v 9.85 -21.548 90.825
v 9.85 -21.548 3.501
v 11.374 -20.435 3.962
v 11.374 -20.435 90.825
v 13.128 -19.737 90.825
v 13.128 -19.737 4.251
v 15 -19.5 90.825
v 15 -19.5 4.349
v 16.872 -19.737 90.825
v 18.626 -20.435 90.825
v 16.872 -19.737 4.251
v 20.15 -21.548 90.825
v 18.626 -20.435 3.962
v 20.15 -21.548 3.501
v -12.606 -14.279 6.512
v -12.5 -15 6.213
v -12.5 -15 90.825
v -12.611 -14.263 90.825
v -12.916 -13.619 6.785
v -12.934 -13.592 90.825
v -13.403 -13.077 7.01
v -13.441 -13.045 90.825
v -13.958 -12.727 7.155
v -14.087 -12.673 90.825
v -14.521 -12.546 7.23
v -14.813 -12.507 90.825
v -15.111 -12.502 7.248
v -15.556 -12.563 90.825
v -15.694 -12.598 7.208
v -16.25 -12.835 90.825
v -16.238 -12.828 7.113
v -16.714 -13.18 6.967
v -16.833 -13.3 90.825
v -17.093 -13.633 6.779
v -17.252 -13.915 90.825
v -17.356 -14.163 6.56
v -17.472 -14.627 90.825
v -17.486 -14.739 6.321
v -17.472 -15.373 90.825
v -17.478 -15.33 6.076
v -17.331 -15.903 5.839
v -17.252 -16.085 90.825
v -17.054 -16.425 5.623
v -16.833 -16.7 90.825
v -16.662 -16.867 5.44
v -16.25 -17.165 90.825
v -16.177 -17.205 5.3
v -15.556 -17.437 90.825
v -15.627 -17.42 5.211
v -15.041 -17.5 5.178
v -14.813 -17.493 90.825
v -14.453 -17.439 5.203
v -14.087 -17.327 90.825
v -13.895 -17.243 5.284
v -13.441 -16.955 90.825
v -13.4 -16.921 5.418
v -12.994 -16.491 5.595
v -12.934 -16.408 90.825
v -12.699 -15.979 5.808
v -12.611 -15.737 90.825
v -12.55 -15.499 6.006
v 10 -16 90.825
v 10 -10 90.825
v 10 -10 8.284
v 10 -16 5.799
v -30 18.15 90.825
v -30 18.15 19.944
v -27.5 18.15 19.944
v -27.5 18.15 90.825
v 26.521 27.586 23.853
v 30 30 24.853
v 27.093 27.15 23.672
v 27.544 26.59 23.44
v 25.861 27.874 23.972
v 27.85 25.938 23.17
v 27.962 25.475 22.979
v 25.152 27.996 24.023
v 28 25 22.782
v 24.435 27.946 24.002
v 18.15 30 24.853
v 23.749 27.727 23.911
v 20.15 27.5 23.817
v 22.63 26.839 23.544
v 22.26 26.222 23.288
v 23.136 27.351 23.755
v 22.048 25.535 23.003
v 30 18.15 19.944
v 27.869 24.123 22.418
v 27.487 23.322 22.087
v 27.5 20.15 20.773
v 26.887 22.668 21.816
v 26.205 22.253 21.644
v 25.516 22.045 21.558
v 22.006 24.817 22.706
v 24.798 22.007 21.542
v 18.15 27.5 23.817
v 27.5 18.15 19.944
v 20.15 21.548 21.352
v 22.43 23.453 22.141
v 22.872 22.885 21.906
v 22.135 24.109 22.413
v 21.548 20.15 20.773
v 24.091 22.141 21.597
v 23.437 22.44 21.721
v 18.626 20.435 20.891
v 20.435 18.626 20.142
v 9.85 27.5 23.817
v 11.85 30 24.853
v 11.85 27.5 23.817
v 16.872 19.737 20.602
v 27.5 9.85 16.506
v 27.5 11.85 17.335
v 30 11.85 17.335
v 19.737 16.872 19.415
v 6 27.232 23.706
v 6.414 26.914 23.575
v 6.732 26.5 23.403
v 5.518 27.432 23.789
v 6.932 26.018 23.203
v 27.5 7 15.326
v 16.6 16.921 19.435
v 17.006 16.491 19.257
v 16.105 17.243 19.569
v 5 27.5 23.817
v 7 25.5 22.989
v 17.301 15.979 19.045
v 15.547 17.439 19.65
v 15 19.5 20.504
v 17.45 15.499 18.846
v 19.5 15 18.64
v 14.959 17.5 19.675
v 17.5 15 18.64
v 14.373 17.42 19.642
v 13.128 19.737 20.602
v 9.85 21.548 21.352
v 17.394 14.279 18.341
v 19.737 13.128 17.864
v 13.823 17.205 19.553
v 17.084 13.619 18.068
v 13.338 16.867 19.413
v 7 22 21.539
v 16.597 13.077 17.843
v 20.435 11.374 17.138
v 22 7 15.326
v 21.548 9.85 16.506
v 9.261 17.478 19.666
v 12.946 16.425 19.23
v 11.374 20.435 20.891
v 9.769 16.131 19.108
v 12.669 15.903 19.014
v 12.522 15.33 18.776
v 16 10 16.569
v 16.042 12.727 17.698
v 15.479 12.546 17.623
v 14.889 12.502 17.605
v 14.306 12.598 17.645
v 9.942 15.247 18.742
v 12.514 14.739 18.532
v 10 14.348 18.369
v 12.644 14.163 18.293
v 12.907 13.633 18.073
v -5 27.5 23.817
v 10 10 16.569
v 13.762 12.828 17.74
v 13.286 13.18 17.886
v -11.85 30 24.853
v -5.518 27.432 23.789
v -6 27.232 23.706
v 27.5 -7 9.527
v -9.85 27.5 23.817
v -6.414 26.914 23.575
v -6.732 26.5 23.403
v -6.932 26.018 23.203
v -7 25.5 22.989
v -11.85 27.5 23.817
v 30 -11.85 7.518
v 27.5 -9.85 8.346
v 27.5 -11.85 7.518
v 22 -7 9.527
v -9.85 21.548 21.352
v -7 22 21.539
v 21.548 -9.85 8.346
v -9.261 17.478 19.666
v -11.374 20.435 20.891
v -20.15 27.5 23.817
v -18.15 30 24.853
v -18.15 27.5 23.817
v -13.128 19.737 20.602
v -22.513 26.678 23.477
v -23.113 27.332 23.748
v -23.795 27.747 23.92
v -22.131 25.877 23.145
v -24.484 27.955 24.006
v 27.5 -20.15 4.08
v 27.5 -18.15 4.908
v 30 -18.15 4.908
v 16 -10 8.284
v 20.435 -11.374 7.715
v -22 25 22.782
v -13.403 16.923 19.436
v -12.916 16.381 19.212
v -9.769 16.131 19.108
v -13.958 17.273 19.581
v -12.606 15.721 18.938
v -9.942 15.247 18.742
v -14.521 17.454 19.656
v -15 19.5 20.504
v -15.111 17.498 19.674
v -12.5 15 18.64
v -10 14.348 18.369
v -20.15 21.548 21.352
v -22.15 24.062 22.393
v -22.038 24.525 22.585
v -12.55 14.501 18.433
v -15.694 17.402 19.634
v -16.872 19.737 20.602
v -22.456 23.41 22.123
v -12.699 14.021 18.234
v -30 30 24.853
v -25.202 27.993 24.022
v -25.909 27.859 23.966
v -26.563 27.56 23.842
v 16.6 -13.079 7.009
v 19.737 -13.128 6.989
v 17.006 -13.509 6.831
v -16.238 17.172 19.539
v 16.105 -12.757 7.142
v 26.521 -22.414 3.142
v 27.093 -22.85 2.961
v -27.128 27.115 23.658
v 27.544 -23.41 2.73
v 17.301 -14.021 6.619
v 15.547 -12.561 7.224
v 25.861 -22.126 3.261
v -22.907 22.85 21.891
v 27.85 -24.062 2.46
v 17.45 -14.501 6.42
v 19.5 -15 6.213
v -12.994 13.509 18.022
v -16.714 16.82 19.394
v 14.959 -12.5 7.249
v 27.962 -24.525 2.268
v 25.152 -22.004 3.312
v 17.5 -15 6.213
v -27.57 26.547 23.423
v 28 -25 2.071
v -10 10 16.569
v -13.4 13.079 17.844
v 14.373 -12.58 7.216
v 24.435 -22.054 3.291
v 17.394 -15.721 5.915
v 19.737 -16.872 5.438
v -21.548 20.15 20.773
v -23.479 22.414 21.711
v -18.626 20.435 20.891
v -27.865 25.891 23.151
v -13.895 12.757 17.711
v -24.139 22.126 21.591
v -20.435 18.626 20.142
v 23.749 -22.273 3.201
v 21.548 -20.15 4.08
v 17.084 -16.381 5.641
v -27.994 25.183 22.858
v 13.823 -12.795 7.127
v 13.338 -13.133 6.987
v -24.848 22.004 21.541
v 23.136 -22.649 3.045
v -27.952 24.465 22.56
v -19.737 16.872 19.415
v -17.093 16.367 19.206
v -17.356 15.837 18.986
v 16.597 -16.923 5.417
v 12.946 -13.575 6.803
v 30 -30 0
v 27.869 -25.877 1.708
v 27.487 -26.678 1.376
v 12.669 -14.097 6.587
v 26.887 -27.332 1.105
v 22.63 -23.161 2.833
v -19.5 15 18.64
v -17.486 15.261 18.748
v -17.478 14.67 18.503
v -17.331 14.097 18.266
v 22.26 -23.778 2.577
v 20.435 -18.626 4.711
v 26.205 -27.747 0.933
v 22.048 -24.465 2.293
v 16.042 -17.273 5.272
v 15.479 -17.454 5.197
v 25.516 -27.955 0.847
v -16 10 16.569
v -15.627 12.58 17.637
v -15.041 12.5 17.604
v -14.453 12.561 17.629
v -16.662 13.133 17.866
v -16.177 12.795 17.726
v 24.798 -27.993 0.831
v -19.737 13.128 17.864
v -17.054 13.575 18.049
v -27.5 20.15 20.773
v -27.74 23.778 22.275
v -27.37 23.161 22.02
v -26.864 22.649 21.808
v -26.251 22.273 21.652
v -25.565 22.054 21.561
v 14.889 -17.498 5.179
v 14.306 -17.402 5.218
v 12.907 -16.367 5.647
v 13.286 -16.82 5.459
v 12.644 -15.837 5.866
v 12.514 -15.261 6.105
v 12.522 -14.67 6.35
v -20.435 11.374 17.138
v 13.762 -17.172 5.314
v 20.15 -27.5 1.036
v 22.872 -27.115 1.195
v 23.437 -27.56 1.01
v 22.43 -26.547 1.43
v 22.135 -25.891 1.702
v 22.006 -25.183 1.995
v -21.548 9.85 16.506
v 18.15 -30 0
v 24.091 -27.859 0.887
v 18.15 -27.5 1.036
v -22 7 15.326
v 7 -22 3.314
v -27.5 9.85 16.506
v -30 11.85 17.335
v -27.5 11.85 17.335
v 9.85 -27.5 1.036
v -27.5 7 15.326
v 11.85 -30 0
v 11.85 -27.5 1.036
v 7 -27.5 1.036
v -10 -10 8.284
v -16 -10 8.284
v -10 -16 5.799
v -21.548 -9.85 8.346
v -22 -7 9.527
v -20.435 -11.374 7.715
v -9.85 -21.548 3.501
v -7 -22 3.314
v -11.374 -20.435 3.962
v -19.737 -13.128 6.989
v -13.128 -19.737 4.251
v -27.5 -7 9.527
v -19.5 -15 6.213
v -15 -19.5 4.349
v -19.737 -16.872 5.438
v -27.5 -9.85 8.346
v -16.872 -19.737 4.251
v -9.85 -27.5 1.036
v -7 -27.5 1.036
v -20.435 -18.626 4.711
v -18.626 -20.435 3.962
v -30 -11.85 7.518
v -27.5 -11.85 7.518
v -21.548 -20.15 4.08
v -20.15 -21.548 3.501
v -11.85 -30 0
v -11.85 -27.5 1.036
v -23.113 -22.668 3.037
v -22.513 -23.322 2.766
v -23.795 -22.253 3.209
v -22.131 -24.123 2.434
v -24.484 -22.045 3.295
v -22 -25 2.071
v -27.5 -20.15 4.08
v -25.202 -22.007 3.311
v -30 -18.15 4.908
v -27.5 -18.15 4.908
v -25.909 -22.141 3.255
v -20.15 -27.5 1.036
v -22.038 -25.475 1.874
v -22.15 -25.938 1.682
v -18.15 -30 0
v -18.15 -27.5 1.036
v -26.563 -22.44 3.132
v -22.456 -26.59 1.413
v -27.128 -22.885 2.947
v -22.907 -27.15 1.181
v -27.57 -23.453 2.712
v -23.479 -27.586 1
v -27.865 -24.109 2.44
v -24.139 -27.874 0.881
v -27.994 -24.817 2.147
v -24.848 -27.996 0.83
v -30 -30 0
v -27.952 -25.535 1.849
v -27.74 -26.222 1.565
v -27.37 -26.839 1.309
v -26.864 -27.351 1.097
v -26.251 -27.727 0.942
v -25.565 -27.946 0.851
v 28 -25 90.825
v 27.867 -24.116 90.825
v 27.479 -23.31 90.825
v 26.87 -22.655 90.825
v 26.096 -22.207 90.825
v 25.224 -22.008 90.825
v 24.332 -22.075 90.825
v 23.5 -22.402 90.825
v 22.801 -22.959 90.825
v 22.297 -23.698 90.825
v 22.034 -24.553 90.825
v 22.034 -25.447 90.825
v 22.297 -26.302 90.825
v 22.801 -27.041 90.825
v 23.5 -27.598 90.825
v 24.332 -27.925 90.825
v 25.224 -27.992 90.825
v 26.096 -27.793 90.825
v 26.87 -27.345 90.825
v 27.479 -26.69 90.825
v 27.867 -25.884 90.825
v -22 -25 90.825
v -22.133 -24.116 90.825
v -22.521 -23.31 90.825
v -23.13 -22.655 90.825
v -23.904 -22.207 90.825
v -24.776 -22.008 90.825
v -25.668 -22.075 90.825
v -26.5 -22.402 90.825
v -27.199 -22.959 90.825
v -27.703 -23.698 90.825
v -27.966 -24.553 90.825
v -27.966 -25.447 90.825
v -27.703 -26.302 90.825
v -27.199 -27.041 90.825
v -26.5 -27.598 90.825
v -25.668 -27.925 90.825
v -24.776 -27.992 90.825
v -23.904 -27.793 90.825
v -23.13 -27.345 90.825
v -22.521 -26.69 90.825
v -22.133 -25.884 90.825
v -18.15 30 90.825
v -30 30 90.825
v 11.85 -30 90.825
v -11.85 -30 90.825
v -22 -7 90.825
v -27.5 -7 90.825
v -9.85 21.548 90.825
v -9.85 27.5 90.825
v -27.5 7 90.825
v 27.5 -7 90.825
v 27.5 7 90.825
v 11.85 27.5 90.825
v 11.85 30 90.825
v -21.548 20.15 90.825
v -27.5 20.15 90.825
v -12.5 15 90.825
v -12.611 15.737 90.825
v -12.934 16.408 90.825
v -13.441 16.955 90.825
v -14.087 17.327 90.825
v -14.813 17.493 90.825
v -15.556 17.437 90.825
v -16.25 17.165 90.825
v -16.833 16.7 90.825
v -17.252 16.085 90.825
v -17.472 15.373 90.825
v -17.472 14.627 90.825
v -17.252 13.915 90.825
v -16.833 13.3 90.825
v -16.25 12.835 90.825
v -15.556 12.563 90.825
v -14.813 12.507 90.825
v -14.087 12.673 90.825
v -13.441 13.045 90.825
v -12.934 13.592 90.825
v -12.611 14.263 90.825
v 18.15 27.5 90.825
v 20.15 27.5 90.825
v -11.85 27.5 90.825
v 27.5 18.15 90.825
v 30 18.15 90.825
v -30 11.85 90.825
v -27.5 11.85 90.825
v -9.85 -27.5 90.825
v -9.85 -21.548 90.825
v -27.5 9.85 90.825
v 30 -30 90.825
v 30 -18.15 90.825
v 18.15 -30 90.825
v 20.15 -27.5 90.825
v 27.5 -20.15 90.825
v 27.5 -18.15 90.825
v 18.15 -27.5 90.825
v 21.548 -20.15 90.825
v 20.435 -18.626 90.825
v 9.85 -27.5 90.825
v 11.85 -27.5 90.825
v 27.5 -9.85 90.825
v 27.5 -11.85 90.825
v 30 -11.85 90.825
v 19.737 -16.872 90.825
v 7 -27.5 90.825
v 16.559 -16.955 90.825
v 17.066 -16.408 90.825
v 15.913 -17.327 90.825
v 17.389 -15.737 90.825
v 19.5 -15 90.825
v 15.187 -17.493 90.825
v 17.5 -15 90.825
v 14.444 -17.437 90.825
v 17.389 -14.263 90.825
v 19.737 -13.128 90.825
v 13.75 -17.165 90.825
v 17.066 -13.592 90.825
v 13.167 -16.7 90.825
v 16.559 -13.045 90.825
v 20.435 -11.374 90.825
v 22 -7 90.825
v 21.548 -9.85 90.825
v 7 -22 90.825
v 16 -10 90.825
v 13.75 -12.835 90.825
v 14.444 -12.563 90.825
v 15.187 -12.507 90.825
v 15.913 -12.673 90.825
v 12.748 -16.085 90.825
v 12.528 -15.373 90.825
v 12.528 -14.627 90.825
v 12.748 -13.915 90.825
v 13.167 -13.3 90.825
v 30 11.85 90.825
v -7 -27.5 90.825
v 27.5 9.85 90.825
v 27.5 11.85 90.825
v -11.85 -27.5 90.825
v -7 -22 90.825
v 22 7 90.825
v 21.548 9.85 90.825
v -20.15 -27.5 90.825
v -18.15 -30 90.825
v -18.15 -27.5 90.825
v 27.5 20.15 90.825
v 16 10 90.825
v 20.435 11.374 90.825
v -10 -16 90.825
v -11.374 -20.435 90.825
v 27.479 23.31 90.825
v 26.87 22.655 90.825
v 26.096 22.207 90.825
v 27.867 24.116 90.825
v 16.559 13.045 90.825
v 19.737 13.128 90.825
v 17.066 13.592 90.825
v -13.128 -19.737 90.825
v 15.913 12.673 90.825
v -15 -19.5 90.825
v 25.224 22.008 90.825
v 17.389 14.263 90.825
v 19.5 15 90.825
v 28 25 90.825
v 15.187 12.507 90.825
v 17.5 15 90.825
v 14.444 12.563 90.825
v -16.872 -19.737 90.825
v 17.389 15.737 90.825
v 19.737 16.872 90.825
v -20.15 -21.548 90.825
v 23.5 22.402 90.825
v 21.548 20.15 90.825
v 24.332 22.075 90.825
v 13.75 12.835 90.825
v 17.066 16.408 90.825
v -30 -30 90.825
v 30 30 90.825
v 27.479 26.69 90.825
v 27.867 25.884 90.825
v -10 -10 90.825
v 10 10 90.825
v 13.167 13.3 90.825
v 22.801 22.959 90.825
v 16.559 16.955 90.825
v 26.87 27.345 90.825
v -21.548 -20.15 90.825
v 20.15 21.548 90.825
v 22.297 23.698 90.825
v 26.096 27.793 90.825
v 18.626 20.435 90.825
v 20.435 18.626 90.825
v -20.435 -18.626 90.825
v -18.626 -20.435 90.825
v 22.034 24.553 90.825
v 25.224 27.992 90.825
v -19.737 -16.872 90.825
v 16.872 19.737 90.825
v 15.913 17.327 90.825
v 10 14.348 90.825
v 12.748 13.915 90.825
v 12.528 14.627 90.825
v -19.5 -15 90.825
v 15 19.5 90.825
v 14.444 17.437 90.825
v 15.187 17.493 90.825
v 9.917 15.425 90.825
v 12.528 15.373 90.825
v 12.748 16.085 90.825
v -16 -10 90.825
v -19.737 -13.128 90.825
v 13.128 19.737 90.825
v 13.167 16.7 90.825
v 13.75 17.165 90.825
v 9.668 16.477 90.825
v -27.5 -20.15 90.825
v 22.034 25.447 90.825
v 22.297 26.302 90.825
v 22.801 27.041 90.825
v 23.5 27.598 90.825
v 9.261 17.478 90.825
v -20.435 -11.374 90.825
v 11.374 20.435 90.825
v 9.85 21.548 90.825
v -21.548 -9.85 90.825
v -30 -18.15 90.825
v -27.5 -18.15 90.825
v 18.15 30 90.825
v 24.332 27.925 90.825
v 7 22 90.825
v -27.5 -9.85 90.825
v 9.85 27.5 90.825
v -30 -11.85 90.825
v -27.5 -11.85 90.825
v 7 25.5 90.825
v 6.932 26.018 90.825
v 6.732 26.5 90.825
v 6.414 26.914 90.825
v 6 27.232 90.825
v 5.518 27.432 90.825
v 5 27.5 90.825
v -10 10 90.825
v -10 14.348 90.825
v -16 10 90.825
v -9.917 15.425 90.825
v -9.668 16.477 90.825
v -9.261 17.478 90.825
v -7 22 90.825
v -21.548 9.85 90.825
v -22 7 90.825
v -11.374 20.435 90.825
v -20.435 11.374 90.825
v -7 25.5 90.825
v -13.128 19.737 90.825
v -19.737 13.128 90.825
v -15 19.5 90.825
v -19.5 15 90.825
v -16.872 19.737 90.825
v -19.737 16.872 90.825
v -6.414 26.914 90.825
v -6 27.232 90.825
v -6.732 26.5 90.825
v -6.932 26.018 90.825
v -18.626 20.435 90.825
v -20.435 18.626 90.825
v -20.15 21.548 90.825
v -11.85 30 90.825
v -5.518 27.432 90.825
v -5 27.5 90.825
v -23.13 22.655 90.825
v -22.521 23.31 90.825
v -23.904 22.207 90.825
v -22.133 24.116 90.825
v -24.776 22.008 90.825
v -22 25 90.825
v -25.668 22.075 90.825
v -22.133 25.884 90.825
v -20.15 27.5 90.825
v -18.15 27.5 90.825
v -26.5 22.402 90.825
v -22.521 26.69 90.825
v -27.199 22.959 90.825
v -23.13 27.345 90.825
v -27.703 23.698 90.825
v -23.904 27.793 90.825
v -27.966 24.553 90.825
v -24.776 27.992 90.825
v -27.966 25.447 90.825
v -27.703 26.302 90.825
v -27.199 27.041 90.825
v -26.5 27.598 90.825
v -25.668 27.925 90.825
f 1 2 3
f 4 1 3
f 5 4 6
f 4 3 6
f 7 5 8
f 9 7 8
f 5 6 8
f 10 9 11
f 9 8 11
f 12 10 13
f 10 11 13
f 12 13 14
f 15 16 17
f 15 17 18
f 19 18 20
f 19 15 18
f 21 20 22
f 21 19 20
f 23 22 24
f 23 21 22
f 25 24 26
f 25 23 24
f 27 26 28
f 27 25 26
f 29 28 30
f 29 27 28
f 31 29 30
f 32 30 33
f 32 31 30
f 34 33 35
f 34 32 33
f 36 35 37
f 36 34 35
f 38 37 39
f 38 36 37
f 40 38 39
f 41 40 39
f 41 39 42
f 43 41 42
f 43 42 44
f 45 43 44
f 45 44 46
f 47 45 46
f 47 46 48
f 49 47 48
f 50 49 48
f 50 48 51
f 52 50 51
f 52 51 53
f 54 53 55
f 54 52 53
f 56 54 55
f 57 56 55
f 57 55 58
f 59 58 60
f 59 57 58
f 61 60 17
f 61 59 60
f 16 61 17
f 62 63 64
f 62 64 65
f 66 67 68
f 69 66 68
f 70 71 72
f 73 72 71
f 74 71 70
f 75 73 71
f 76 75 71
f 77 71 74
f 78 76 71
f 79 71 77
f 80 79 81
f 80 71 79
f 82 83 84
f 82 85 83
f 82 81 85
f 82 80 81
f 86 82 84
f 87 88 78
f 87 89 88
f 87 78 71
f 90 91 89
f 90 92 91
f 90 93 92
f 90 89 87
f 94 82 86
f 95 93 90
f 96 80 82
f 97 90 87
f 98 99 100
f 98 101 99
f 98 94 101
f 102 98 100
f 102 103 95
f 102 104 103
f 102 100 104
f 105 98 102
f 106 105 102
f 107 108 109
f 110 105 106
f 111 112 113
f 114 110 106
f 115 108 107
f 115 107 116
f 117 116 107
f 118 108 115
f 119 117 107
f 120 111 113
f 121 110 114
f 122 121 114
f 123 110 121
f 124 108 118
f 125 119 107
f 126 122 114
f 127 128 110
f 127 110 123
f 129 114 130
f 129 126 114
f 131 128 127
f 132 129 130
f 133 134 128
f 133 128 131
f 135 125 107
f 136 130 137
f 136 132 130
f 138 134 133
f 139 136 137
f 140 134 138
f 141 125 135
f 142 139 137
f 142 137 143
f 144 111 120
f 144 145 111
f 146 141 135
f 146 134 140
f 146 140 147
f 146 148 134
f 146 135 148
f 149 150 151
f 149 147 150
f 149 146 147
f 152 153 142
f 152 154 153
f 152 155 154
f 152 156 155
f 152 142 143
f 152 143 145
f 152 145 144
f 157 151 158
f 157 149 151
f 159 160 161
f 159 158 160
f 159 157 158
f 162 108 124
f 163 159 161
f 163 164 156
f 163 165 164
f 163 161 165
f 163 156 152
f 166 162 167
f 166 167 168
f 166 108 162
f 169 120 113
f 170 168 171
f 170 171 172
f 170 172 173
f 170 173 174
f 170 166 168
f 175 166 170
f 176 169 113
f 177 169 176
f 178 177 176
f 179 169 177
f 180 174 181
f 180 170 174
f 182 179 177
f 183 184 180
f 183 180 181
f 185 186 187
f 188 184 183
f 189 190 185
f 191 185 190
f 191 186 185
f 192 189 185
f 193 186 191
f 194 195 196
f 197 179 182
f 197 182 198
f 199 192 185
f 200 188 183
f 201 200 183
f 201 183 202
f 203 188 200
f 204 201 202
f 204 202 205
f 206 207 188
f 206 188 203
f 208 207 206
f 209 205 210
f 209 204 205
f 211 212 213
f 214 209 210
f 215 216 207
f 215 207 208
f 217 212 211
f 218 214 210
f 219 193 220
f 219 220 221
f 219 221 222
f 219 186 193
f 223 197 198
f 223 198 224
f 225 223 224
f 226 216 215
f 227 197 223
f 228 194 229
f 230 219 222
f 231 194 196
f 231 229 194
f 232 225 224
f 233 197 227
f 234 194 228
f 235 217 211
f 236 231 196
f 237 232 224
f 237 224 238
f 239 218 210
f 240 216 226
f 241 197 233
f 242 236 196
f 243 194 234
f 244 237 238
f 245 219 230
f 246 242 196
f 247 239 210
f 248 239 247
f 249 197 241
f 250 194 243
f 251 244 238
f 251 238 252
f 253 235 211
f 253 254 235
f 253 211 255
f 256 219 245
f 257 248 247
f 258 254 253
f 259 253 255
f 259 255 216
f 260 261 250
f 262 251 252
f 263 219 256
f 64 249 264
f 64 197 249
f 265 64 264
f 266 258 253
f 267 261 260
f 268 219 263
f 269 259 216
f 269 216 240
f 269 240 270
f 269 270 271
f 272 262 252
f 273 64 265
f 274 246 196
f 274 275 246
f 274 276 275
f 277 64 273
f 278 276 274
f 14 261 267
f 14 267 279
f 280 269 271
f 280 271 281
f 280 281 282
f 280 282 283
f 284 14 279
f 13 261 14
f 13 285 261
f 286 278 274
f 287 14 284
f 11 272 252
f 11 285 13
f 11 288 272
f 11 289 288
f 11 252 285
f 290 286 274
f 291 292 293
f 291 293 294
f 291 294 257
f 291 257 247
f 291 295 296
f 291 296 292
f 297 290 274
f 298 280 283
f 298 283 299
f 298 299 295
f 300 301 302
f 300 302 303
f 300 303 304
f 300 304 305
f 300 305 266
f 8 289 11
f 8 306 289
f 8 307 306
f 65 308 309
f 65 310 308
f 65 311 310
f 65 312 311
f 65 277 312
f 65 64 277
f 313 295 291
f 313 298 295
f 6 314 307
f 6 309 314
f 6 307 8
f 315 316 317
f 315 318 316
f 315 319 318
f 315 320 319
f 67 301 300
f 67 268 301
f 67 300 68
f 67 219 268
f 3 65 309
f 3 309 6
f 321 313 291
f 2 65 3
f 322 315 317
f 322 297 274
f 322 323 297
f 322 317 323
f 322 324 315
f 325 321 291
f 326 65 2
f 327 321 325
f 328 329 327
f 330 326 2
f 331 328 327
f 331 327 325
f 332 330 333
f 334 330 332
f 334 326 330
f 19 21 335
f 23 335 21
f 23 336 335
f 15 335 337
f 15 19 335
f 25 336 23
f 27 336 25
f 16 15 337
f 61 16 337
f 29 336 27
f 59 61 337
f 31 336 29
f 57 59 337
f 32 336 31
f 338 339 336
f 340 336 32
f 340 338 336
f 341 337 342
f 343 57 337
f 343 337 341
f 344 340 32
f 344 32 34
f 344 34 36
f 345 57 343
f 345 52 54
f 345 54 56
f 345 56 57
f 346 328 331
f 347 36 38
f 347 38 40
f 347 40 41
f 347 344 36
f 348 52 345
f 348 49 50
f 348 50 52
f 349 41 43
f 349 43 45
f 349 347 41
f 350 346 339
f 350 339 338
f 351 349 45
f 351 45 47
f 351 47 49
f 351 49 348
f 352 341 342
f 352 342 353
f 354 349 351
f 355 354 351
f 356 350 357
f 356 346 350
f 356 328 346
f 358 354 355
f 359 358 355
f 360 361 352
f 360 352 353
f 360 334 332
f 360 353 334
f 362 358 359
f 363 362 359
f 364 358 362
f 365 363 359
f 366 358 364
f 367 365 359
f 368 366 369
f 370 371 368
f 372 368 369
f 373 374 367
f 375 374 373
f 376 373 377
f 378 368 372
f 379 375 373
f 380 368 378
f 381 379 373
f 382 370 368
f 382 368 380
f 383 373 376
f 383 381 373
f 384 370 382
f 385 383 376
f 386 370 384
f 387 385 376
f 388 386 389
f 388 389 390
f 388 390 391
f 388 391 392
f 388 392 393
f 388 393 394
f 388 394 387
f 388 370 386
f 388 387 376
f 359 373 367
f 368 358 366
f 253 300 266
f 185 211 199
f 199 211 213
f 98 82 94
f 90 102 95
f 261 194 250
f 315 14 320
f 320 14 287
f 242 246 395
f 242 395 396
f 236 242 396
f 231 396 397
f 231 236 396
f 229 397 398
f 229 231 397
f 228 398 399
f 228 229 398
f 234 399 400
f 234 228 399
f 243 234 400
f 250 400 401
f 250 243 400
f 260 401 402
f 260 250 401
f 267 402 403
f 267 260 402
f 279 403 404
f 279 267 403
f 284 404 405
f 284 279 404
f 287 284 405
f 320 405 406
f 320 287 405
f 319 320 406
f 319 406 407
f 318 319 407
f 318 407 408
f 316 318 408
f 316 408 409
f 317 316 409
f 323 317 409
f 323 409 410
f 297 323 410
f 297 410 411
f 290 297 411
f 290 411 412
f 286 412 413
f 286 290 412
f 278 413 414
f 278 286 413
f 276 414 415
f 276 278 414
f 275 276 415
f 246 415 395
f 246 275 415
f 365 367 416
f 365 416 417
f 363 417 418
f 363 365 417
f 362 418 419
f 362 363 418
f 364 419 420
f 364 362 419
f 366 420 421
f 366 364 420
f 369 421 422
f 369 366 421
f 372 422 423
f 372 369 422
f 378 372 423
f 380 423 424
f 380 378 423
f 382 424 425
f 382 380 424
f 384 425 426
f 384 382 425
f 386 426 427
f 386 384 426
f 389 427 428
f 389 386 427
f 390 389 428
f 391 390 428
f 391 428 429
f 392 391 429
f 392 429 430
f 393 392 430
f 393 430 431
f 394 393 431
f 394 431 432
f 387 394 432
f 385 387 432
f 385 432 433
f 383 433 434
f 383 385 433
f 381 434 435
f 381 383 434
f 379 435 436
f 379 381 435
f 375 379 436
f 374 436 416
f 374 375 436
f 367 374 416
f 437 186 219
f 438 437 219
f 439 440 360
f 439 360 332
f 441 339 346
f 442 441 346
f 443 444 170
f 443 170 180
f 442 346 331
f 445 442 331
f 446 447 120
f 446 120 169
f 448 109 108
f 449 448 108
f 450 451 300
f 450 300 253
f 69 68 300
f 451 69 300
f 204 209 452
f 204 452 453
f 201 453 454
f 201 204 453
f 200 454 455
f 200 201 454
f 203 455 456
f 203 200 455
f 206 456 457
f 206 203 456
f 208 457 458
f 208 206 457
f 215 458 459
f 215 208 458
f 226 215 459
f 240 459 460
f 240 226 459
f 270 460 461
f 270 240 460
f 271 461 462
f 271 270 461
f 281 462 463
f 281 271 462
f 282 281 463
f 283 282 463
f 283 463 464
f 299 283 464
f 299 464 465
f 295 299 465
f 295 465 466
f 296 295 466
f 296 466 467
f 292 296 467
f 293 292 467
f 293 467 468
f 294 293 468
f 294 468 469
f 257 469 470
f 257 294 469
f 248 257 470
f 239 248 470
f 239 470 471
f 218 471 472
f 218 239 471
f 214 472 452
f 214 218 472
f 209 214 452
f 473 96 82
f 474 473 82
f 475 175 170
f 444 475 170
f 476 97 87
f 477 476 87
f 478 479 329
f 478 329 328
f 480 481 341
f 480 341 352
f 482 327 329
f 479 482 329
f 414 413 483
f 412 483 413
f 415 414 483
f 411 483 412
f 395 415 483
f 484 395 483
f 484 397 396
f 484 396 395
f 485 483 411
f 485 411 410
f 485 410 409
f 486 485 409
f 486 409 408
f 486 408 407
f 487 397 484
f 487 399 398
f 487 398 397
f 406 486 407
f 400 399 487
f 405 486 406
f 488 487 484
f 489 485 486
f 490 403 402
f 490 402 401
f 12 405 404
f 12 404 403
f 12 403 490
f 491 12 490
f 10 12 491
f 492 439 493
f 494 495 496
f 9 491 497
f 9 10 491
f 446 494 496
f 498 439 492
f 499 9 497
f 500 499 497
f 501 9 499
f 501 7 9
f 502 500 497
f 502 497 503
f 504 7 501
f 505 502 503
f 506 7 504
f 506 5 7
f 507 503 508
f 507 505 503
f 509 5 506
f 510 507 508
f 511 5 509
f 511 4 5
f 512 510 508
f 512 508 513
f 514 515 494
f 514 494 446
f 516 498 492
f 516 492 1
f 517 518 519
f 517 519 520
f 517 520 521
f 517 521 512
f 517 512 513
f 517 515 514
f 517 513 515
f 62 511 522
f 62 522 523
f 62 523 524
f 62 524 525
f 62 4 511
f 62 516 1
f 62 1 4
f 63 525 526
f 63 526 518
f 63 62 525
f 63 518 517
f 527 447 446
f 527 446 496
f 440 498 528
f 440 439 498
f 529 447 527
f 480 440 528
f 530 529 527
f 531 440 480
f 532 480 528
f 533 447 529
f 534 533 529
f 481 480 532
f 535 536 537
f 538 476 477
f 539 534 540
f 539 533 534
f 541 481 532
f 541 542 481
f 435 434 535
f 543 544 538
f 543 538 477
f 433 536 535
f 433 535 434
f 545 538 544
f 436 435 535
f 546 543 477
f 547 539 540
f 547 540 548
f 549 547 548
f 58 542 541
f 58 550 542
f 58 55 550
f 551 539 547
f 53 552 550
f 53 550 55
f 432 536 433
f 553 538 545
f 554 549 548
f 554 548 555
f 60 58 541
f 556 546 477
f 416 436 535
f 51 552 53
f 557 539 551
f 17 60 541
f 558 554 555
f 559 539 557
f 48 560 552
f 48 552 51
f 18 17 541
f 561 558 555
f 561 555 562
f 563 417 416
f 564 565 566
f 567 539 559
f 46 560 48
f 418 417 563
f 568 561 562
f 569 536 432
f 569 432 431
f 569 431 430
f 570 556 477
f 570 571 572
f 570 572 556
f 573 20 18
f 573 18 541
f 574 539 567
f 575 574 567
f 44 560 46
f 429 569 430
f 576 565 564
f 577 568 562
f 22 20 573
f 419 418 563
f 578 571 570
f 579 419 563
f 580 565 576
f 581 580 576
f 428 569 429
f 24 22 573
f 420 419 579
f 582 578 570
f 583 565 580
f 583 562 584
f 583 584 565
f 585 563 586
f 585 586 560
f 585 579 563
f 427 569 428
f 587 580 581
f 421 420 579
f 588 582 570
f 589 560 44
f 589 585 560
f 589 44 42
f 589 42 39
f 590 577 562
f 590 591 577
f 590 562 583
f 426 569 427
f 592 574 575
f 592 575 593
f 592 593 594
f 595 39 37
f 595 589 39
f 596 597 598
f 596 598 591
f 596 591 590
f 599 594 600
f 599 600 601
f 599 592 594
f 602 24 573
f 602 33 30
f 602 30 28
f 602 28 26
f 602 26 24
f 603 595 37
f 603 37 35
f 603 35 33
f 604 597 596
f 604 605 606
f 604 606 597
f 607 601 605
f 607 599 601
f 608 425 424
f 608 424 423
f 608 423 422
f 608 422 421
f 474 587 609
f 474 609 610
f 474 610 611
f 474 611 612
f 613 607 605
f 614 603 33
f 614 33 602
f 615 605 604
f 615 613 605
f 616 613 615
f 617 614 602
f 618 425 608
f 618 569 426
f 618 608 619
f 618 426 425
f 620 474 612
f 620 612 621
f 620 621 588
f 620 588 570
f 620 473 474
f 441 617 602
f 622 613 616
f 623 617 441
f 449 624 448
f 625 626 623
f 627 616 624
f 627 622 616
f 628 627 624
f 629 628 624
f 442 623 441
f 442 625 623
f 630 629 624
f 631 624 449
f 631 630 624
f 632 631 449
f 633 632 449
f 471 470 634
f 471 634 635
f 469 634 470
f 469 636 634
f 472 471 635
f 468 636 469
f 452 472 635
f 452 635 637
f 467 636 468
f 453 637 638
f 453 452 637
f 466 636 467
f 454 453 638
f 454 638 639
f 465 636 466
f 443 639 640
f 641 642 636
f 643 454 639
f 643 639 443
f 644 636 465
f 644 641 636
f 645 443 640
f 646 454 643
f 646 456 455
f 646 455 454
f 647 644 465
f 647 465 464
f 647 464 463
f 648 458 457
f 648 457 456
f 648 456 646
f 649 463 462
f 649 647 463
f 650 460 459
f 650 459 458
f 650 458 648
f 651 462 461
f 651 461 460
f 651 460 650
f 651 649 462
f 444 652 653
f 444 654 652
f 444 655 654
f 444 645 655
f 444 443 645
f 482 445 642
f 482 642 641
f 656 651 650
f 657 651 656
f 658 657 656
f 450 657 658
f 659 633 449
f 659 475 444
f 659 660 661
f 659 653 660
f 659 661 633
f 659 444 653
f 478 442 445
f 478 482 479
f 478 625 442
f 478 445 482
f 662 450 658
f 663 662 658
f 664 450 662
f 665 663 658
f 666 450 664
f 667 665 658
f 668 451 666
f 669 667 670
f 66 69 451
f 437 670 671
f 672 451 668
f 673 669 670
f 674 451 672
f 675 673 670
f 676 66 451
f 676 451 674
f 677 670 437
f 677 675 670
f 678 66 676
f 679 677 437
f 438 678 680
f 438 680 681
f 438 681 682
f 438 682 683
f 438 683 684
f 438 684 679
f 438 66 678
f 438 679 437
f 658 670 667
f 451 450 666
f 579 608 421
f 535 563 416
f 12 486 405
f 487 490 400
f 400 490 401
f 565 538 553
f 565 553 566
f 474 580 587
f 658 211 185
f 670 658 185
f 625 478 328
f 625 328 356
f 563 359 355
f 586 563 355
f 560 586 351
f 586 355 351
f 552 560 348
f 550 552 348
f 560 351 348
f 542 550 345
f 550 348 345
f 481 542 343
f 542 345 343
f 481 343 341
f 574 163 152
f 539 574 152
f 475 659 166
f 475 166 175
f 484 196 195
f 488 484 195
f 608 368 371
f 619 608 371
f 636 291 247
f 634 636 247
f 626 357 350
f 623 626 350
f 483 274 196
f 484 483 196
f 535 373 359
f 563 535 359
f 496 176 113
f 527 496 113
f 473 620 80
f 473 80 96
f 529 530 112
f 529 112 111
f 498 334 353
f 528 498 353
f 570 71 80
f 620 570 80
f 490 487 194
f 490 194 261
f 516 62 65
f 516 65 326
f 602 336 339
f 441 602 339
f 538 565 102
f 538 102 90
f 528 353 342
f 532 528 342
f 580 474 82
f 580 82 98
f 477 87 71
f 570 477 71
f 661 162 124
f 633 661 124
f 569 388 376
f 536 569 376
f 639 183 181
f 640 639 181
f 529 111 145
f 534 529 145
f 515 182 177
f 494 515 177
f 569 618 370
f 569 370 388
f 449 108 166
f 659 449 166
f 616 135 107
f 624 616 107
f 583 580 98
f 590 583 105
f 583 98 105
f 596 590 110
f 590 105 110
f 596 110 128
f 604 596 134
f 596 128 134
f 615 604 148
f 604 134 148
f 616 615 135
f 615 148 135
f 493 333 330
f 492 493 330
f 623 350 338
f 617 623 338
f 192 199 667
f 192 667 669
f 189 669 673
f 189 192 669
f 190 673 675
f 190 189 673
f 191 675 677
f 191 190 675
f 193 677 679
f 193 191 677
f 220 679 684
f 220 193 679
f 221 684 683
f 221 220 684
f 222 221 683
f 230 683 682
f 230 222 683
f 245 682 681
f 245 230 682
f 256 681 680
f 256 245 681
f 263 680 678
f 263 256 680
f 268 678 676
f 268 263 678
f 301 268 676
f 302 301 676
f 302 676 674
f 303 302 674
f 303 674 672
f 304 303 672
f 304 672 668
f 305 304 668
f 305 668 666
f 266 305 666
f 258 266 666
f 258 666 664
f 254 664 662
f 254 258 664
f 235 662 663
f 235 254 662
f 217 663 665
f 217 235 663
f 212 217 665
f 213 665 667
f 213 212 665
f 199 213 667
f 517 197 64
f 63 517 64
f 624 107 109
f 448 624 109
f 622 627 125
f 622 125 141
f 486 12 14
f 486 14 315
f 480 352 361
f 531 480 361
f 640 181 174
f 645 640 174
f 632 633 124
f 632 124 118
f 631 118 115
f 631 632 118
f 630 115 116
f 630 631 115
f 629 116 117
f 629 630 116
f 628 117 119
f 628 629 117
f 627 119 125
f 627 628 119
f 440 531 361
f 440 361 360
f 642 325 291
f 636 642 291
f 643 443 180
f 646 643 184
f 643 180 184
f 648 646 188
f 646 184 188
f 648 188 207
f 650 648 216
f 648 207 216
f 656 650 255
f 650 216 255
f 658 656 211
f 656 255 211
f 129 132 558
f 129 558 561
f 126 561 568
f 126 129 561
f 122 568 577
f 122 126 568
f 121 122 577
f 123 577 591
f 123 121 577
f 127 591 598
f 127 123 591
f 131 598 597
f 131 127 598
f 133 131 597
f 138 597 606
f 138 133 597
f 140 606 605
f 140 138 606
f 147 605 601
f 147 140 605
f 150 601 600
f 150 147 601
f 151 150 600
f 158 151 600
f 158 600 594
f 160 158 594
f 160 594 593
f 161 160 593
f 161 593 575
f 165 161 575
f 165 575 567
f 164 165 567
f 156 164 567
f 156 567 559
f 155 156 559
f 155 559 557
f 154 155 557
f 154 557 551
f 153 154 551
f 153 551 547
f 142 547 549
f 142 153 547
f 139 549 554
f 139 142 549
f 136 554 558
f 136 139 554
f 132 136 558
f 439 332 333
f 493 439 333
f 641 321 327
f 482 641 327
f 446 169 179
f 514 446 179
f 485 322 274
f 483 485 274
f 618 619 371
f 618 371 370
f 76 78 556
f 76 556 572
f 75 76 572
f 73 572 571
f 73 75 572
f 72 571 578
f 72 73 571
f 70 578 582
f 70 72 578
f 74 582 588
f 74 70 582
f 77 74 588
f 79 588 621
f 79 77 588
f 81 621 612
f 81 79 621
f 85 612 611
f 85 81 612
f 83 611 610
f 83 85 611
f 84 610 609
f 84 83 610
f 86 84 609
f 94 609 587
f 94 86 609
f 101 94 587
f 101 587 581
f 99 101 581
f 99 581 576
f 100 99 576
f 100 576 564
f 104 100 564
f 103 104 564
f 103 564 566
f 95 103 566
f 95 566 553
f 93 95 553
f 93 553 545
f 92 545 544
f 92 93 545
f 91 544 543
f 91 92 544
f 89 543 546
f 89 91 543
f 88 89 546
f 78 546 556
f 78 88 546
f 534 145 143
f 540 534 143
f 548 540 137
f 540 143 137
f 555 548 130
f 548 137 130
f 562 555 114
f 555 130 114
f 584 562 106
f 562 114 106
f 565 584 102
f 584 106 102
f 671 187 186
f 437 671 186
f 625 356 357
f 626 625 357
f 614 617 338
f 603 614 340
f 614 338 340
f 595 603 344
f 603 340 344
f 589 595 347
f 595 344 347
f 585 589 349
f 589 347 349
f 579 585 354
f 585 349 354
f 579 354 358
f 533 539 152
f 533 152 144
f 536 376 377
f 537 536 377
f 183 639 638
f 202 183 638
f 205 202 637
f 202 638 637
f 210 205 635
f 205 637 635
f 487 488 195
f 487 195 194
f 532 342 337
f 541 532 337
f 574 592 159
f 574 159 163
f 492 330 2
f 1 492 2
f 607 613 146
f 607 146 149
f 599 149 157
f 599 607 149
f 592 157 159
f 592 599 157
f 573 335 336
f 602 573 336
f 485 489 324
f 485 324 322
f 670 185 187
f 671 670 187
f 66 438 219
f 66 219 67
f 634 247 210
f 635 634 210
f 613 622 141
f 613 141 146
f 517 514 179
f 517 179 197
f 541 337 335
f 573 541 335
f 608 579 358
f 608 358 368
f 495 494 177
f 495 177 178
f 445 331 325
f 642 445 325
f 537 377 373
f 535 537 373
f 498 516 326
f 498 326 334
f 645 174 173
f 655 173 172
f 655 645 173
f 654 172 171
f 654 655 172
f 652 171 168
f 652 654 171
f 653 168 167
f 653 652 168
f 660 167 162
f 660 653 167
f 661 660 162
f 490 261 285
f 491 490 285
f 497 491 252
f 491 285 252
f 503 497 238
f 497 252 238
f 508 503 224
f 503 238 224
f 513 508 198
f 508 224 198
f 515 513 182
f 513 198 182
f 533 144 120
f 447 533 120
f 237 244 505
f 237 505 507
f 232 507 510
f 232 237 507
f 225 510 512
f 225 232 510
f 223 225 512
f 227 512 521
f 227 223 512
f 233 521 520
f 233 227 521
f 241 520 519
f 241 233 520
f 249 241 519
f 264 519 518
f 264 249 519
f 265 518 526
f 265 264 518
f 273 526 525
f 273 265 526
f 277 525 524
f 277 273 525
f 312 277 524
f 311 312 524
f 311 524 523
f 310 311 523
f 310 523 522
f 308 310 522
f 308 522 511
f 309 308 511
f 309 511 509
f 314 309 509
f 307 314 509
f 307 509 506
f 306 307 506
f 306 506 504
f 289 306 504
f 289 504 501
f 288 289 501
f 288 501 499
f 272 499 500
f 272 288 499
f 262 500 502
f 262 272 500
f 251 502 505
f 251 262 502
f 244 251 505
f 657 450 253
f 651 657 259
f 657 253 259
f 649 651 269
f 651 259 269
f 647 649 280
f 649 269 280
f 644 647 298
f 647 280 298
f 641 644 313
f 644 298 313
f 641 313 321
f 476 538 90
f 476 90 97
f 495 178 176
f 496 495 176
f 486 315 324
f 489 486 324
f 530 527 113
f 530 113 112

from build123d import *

# Parameters (mm, degrees)
F0_R          = 3
F0_R_2        = 2.5
F1_DEPTH      = 115.678
F2_R          = 2
F3_R          = 7
F6_DEPTH      = 30
F6_DEPTH_BACK = 30
F7_W          = 131.1645284295
F7_H          = 50.7057756186
F8_DEPTH      = 30
F8_DEPTH_BACK = 30


# Not quite as in the source:
# - a feature names something its author has since deleted; it is built from what else it names


with BuildPart() as f1:
    # F0 (on Top) → F1 (new body)
    with BuildSketch(Plane.XY):
        with BuildLine():
            Line((18.15, -30), (30, -30))
            Line((30, -30), (30, -18.15))
            Line((30, -18.15), (27.5, -18.15))
            Line((27.5, -18.15), (27.5, -20.15))
            Line((27.5, -20.15), (21.5477069044, -20.15))
            ThreePointArc((21.5477069044, -20.15), (19.5, -15), (21.5477069044, -9.85))
            Line((21.5477069044, -9.85), (27.5, -9.85))
            Line((27.5, -9.85), (27.5, -11.85))
            Line((27.5, -11.85), (30, -11.85))
            Line((30, -11.85), (30, 11.85))
            Line((30, 11.85), (27.5, 11.85))
            Line((27.5, 11.85), (27.5, 9.85))
            Line((27.5, 9.85), (21.5477069044, 9.85))
            ThreePointArc((21.5477069044, 9.85), (19.5, 15), (21.5477069044, 20.15))
            Line((21.5477069044, 20.15), (27.5, 20.15))
            Line((27.5, 20.15), (27.5, 18.15))
            Line((27.5, 18.15), (30, 18.15))
            Line((30, 18.15), (30, 30))
            Line((30, 30), (18.15, 30))
            Line((18.15, 30), (18.15, 27.5))
            Line((18.15, 27.5), (20.15, 27.5))
            Line((20.15, 27.5), (20.15, 21.5477069044))
            ThreePointArc((20.15, 21.5477069044), (15, 19.5), (9.85, 21.5477069044))
            Line((9.85, 21.5477069044), (9.85, 27.5))
            Line((9.85, 27.5), (11.85, 27.5))
            Line((11.85, 27.5), (11.85, 30))
            Line((11.85, 30), (-11.85, 30))
            Line((-11.85, 30), (-11.85, 27.5))
            Line((-11.85, 27.5), (-9.85, 27.5))
            Line((-9.85, 27.5), (-9.85, 21.5477069044))
            ThreePointArc((-9.85, 21.5477069044), (-15, 19.5), (-20.15, 21.5477069044))
            Line((-20.15, 21.5477069044), (-20.15, 27.5))
            Line((-20.15, 27.5), (-18.15, 27.5))
            Line((-18.15, 27.5), (-18.15, 30))
            Line((-18.15, 30), (-30, 30))
            Line((-30, 30), (-30, 18.15))
            Line((-30, 18.15), (-27.5, 18.15))
            Line((-27.5, 18.15), (-27.5, 20.15))
            Line((-27.5, 20.15), (-21.5477069044, 20.15))
            ThreePointArc((-21.5477069044, 20.15), (-19.5, 15), (-21.5477069044, 9.85))
            Line((-21.5477069044, 9.85), (-27.5, 9.85))
            Line((-27.5, 9.85), (-27.5, 11.85))
            Line((-27.5, 11.85), (-30, 11.85))
            Line((-30, 11.85), (-30, -11.85))
            Line((-30, -11.85), (-27.5, -11.85))
            Line((-27.5, -11.85), (-27.5, -9.85))
            Line((-27.5, -9.85), (-21.5477069044, -9.85))
            ThreePointArc((-21.5477069044, -9.85), (-19.5, -15), (-21.5477069044, -20.15))
            Line((-21.5477069044, -20.15), (-27.5, -20.15))
            Line((-27.5, -20.15), (-27.5, -18.15))
            Line((-27.5, -18.15), (-30, -18.15))
            Line((-30, -18.15), (-30, -30))
            Line((-30, -30), (-18.15, -30))
            Line((-18.15, -30), (-18.15, -27.5))
            Line((-18.15, -27.5), (-20.15, -27.5))
            Line((-20.15, -27.5), (-20.15, -21.5477069044))
            ThreePointArc((-20.15, -21.5477069044), (-15, -19.5), (-9.85, -21.5477069044))
            Line((-9.85, -21.5477069044), (-9.85, -27.5))
            Line((-9.85, -27.5), (-11.85, -27.5))
            Line((-11.85, -27.5), (-11.85, -30))
            Line((-11.85, -30), (11.85, -30))
            Line((11.85, -30), (11.85, -27.5))
            Line((11.85, -27.5), (9.85, -27.5))
            Line((9.85, -27.5), (9.85, -21.5477069044))
            ThreePointArc((9.85, -21.5477069044), (15, -19.5), (20.15, -21.5477069044))
            Line((20.15, -21.5477069044), (20.15, -27.5))
            Line((20.15, -27.5), (18.15, -27.5))
            Line((18.15, -27.5), (18.15, -30))
        make_face()
        with Locations((-25, -25)):
            Circle(F0_R, mode=Mode.SUBTRACT)
        with Locations((-15, -15)):
            Circle(F0_R_2, mode=Mode.SUBTRACT)
        with Locations((25, -25)):
            Circle(F0_R, mode=Mode.SUBTRACT)
        with Locations((15, -15)):
            Circle(F0_R_2, mode=Mode.SUBTRACT)
        with Locations((-25, 25)):
            Circle(F0_R, mode=Mode.SUBTRACT)
        with Locations((-15, 15)):
            Circle(F0_R_2, mode=Mode.SUBTRACT)
        Polygon((-7, 22), (-7, 27.5), (0, 27.5), (7, 27.5), (7, 22), (10, 16), (10, 10), (16, 10), (22, 7), (27.5, 7), (27.5, 0), (27.5, -7), (22, -7), (16, -10), (10, -10), (10, -16), (7, -22), (7, -27.5), (0, -27.5), (-7, -27.5), (-7, -22), (-10, -16), (-10, -10), (-16, -10), (-22, -7), (-27.5, -7), (-27.5, 0), (-27.5, 7), (-22, 7), (-16, 10), (-10, 10), (-10, 16), align=None, mode=Mode.SUBTRACT)
        with Locations((15, 15)):
            Circle(F0_R_2, mode=Mode.SUBTRACT)
        with Locations((25, 25)):
            Circle(F0_R, mode=Mode.SUBTRACT)
    extrude(amount=F1_DEPTH)

    # F2
    f2_edges = [f1.edges().sort_by_distance(p)[0] for p in [
        (-7, 27.5, 57.839),
        (7, 27.5, 57.839),
    ]]
    fillet(f2_edges, radius=F2_R)

    # F3
    f3_edges = [f1.edges().sort_by_distance(p)[0] for p in [
        (-10, 16, 57.839),
        (10, 16, 57.839),
    ]]
    fillet(f3_edges, radius=F3_R)

    # F5 (on Right) → F6 (cut, two sides)
    with BuildSketch(Plane.YZ) as f6_sk:
        Polygon((214.5999793503, -135.2321386172), (130.9673605882, 66.674863855), (-30, 0), (53.6326187621, -201.9070024722), align=None)
        Polygon((30, 115.678), (-2.0081647111, 192.9525453523), (-162.3392477394, 126.541236292), (-130.3310830283, 49.2666909397), align=None)
    extrude(amount=-F6_DEPTH, mode=Mode.SUBTRACT)
    extrude(f6_sk.sketch, amount=F6_DEPTH_BACK, mode=Mode.SUBTRACT)

    # F7 (on Right) → F8 (cut, two sides)
    with BuildSketch(Plane.YZ) as f8_sk:
        with Locations((35.5822642148, 116.1780740669)):
            Rectangle(F7_W, F7_H)
    extrude(amount=F8_DEPTH, mode=Mode.SUBTRACT)
    extrude(f8_sk.sketch, amount=-F8_DEPTH_BACK, mode=Mode.SUBTRACT)


solid = f1.part
